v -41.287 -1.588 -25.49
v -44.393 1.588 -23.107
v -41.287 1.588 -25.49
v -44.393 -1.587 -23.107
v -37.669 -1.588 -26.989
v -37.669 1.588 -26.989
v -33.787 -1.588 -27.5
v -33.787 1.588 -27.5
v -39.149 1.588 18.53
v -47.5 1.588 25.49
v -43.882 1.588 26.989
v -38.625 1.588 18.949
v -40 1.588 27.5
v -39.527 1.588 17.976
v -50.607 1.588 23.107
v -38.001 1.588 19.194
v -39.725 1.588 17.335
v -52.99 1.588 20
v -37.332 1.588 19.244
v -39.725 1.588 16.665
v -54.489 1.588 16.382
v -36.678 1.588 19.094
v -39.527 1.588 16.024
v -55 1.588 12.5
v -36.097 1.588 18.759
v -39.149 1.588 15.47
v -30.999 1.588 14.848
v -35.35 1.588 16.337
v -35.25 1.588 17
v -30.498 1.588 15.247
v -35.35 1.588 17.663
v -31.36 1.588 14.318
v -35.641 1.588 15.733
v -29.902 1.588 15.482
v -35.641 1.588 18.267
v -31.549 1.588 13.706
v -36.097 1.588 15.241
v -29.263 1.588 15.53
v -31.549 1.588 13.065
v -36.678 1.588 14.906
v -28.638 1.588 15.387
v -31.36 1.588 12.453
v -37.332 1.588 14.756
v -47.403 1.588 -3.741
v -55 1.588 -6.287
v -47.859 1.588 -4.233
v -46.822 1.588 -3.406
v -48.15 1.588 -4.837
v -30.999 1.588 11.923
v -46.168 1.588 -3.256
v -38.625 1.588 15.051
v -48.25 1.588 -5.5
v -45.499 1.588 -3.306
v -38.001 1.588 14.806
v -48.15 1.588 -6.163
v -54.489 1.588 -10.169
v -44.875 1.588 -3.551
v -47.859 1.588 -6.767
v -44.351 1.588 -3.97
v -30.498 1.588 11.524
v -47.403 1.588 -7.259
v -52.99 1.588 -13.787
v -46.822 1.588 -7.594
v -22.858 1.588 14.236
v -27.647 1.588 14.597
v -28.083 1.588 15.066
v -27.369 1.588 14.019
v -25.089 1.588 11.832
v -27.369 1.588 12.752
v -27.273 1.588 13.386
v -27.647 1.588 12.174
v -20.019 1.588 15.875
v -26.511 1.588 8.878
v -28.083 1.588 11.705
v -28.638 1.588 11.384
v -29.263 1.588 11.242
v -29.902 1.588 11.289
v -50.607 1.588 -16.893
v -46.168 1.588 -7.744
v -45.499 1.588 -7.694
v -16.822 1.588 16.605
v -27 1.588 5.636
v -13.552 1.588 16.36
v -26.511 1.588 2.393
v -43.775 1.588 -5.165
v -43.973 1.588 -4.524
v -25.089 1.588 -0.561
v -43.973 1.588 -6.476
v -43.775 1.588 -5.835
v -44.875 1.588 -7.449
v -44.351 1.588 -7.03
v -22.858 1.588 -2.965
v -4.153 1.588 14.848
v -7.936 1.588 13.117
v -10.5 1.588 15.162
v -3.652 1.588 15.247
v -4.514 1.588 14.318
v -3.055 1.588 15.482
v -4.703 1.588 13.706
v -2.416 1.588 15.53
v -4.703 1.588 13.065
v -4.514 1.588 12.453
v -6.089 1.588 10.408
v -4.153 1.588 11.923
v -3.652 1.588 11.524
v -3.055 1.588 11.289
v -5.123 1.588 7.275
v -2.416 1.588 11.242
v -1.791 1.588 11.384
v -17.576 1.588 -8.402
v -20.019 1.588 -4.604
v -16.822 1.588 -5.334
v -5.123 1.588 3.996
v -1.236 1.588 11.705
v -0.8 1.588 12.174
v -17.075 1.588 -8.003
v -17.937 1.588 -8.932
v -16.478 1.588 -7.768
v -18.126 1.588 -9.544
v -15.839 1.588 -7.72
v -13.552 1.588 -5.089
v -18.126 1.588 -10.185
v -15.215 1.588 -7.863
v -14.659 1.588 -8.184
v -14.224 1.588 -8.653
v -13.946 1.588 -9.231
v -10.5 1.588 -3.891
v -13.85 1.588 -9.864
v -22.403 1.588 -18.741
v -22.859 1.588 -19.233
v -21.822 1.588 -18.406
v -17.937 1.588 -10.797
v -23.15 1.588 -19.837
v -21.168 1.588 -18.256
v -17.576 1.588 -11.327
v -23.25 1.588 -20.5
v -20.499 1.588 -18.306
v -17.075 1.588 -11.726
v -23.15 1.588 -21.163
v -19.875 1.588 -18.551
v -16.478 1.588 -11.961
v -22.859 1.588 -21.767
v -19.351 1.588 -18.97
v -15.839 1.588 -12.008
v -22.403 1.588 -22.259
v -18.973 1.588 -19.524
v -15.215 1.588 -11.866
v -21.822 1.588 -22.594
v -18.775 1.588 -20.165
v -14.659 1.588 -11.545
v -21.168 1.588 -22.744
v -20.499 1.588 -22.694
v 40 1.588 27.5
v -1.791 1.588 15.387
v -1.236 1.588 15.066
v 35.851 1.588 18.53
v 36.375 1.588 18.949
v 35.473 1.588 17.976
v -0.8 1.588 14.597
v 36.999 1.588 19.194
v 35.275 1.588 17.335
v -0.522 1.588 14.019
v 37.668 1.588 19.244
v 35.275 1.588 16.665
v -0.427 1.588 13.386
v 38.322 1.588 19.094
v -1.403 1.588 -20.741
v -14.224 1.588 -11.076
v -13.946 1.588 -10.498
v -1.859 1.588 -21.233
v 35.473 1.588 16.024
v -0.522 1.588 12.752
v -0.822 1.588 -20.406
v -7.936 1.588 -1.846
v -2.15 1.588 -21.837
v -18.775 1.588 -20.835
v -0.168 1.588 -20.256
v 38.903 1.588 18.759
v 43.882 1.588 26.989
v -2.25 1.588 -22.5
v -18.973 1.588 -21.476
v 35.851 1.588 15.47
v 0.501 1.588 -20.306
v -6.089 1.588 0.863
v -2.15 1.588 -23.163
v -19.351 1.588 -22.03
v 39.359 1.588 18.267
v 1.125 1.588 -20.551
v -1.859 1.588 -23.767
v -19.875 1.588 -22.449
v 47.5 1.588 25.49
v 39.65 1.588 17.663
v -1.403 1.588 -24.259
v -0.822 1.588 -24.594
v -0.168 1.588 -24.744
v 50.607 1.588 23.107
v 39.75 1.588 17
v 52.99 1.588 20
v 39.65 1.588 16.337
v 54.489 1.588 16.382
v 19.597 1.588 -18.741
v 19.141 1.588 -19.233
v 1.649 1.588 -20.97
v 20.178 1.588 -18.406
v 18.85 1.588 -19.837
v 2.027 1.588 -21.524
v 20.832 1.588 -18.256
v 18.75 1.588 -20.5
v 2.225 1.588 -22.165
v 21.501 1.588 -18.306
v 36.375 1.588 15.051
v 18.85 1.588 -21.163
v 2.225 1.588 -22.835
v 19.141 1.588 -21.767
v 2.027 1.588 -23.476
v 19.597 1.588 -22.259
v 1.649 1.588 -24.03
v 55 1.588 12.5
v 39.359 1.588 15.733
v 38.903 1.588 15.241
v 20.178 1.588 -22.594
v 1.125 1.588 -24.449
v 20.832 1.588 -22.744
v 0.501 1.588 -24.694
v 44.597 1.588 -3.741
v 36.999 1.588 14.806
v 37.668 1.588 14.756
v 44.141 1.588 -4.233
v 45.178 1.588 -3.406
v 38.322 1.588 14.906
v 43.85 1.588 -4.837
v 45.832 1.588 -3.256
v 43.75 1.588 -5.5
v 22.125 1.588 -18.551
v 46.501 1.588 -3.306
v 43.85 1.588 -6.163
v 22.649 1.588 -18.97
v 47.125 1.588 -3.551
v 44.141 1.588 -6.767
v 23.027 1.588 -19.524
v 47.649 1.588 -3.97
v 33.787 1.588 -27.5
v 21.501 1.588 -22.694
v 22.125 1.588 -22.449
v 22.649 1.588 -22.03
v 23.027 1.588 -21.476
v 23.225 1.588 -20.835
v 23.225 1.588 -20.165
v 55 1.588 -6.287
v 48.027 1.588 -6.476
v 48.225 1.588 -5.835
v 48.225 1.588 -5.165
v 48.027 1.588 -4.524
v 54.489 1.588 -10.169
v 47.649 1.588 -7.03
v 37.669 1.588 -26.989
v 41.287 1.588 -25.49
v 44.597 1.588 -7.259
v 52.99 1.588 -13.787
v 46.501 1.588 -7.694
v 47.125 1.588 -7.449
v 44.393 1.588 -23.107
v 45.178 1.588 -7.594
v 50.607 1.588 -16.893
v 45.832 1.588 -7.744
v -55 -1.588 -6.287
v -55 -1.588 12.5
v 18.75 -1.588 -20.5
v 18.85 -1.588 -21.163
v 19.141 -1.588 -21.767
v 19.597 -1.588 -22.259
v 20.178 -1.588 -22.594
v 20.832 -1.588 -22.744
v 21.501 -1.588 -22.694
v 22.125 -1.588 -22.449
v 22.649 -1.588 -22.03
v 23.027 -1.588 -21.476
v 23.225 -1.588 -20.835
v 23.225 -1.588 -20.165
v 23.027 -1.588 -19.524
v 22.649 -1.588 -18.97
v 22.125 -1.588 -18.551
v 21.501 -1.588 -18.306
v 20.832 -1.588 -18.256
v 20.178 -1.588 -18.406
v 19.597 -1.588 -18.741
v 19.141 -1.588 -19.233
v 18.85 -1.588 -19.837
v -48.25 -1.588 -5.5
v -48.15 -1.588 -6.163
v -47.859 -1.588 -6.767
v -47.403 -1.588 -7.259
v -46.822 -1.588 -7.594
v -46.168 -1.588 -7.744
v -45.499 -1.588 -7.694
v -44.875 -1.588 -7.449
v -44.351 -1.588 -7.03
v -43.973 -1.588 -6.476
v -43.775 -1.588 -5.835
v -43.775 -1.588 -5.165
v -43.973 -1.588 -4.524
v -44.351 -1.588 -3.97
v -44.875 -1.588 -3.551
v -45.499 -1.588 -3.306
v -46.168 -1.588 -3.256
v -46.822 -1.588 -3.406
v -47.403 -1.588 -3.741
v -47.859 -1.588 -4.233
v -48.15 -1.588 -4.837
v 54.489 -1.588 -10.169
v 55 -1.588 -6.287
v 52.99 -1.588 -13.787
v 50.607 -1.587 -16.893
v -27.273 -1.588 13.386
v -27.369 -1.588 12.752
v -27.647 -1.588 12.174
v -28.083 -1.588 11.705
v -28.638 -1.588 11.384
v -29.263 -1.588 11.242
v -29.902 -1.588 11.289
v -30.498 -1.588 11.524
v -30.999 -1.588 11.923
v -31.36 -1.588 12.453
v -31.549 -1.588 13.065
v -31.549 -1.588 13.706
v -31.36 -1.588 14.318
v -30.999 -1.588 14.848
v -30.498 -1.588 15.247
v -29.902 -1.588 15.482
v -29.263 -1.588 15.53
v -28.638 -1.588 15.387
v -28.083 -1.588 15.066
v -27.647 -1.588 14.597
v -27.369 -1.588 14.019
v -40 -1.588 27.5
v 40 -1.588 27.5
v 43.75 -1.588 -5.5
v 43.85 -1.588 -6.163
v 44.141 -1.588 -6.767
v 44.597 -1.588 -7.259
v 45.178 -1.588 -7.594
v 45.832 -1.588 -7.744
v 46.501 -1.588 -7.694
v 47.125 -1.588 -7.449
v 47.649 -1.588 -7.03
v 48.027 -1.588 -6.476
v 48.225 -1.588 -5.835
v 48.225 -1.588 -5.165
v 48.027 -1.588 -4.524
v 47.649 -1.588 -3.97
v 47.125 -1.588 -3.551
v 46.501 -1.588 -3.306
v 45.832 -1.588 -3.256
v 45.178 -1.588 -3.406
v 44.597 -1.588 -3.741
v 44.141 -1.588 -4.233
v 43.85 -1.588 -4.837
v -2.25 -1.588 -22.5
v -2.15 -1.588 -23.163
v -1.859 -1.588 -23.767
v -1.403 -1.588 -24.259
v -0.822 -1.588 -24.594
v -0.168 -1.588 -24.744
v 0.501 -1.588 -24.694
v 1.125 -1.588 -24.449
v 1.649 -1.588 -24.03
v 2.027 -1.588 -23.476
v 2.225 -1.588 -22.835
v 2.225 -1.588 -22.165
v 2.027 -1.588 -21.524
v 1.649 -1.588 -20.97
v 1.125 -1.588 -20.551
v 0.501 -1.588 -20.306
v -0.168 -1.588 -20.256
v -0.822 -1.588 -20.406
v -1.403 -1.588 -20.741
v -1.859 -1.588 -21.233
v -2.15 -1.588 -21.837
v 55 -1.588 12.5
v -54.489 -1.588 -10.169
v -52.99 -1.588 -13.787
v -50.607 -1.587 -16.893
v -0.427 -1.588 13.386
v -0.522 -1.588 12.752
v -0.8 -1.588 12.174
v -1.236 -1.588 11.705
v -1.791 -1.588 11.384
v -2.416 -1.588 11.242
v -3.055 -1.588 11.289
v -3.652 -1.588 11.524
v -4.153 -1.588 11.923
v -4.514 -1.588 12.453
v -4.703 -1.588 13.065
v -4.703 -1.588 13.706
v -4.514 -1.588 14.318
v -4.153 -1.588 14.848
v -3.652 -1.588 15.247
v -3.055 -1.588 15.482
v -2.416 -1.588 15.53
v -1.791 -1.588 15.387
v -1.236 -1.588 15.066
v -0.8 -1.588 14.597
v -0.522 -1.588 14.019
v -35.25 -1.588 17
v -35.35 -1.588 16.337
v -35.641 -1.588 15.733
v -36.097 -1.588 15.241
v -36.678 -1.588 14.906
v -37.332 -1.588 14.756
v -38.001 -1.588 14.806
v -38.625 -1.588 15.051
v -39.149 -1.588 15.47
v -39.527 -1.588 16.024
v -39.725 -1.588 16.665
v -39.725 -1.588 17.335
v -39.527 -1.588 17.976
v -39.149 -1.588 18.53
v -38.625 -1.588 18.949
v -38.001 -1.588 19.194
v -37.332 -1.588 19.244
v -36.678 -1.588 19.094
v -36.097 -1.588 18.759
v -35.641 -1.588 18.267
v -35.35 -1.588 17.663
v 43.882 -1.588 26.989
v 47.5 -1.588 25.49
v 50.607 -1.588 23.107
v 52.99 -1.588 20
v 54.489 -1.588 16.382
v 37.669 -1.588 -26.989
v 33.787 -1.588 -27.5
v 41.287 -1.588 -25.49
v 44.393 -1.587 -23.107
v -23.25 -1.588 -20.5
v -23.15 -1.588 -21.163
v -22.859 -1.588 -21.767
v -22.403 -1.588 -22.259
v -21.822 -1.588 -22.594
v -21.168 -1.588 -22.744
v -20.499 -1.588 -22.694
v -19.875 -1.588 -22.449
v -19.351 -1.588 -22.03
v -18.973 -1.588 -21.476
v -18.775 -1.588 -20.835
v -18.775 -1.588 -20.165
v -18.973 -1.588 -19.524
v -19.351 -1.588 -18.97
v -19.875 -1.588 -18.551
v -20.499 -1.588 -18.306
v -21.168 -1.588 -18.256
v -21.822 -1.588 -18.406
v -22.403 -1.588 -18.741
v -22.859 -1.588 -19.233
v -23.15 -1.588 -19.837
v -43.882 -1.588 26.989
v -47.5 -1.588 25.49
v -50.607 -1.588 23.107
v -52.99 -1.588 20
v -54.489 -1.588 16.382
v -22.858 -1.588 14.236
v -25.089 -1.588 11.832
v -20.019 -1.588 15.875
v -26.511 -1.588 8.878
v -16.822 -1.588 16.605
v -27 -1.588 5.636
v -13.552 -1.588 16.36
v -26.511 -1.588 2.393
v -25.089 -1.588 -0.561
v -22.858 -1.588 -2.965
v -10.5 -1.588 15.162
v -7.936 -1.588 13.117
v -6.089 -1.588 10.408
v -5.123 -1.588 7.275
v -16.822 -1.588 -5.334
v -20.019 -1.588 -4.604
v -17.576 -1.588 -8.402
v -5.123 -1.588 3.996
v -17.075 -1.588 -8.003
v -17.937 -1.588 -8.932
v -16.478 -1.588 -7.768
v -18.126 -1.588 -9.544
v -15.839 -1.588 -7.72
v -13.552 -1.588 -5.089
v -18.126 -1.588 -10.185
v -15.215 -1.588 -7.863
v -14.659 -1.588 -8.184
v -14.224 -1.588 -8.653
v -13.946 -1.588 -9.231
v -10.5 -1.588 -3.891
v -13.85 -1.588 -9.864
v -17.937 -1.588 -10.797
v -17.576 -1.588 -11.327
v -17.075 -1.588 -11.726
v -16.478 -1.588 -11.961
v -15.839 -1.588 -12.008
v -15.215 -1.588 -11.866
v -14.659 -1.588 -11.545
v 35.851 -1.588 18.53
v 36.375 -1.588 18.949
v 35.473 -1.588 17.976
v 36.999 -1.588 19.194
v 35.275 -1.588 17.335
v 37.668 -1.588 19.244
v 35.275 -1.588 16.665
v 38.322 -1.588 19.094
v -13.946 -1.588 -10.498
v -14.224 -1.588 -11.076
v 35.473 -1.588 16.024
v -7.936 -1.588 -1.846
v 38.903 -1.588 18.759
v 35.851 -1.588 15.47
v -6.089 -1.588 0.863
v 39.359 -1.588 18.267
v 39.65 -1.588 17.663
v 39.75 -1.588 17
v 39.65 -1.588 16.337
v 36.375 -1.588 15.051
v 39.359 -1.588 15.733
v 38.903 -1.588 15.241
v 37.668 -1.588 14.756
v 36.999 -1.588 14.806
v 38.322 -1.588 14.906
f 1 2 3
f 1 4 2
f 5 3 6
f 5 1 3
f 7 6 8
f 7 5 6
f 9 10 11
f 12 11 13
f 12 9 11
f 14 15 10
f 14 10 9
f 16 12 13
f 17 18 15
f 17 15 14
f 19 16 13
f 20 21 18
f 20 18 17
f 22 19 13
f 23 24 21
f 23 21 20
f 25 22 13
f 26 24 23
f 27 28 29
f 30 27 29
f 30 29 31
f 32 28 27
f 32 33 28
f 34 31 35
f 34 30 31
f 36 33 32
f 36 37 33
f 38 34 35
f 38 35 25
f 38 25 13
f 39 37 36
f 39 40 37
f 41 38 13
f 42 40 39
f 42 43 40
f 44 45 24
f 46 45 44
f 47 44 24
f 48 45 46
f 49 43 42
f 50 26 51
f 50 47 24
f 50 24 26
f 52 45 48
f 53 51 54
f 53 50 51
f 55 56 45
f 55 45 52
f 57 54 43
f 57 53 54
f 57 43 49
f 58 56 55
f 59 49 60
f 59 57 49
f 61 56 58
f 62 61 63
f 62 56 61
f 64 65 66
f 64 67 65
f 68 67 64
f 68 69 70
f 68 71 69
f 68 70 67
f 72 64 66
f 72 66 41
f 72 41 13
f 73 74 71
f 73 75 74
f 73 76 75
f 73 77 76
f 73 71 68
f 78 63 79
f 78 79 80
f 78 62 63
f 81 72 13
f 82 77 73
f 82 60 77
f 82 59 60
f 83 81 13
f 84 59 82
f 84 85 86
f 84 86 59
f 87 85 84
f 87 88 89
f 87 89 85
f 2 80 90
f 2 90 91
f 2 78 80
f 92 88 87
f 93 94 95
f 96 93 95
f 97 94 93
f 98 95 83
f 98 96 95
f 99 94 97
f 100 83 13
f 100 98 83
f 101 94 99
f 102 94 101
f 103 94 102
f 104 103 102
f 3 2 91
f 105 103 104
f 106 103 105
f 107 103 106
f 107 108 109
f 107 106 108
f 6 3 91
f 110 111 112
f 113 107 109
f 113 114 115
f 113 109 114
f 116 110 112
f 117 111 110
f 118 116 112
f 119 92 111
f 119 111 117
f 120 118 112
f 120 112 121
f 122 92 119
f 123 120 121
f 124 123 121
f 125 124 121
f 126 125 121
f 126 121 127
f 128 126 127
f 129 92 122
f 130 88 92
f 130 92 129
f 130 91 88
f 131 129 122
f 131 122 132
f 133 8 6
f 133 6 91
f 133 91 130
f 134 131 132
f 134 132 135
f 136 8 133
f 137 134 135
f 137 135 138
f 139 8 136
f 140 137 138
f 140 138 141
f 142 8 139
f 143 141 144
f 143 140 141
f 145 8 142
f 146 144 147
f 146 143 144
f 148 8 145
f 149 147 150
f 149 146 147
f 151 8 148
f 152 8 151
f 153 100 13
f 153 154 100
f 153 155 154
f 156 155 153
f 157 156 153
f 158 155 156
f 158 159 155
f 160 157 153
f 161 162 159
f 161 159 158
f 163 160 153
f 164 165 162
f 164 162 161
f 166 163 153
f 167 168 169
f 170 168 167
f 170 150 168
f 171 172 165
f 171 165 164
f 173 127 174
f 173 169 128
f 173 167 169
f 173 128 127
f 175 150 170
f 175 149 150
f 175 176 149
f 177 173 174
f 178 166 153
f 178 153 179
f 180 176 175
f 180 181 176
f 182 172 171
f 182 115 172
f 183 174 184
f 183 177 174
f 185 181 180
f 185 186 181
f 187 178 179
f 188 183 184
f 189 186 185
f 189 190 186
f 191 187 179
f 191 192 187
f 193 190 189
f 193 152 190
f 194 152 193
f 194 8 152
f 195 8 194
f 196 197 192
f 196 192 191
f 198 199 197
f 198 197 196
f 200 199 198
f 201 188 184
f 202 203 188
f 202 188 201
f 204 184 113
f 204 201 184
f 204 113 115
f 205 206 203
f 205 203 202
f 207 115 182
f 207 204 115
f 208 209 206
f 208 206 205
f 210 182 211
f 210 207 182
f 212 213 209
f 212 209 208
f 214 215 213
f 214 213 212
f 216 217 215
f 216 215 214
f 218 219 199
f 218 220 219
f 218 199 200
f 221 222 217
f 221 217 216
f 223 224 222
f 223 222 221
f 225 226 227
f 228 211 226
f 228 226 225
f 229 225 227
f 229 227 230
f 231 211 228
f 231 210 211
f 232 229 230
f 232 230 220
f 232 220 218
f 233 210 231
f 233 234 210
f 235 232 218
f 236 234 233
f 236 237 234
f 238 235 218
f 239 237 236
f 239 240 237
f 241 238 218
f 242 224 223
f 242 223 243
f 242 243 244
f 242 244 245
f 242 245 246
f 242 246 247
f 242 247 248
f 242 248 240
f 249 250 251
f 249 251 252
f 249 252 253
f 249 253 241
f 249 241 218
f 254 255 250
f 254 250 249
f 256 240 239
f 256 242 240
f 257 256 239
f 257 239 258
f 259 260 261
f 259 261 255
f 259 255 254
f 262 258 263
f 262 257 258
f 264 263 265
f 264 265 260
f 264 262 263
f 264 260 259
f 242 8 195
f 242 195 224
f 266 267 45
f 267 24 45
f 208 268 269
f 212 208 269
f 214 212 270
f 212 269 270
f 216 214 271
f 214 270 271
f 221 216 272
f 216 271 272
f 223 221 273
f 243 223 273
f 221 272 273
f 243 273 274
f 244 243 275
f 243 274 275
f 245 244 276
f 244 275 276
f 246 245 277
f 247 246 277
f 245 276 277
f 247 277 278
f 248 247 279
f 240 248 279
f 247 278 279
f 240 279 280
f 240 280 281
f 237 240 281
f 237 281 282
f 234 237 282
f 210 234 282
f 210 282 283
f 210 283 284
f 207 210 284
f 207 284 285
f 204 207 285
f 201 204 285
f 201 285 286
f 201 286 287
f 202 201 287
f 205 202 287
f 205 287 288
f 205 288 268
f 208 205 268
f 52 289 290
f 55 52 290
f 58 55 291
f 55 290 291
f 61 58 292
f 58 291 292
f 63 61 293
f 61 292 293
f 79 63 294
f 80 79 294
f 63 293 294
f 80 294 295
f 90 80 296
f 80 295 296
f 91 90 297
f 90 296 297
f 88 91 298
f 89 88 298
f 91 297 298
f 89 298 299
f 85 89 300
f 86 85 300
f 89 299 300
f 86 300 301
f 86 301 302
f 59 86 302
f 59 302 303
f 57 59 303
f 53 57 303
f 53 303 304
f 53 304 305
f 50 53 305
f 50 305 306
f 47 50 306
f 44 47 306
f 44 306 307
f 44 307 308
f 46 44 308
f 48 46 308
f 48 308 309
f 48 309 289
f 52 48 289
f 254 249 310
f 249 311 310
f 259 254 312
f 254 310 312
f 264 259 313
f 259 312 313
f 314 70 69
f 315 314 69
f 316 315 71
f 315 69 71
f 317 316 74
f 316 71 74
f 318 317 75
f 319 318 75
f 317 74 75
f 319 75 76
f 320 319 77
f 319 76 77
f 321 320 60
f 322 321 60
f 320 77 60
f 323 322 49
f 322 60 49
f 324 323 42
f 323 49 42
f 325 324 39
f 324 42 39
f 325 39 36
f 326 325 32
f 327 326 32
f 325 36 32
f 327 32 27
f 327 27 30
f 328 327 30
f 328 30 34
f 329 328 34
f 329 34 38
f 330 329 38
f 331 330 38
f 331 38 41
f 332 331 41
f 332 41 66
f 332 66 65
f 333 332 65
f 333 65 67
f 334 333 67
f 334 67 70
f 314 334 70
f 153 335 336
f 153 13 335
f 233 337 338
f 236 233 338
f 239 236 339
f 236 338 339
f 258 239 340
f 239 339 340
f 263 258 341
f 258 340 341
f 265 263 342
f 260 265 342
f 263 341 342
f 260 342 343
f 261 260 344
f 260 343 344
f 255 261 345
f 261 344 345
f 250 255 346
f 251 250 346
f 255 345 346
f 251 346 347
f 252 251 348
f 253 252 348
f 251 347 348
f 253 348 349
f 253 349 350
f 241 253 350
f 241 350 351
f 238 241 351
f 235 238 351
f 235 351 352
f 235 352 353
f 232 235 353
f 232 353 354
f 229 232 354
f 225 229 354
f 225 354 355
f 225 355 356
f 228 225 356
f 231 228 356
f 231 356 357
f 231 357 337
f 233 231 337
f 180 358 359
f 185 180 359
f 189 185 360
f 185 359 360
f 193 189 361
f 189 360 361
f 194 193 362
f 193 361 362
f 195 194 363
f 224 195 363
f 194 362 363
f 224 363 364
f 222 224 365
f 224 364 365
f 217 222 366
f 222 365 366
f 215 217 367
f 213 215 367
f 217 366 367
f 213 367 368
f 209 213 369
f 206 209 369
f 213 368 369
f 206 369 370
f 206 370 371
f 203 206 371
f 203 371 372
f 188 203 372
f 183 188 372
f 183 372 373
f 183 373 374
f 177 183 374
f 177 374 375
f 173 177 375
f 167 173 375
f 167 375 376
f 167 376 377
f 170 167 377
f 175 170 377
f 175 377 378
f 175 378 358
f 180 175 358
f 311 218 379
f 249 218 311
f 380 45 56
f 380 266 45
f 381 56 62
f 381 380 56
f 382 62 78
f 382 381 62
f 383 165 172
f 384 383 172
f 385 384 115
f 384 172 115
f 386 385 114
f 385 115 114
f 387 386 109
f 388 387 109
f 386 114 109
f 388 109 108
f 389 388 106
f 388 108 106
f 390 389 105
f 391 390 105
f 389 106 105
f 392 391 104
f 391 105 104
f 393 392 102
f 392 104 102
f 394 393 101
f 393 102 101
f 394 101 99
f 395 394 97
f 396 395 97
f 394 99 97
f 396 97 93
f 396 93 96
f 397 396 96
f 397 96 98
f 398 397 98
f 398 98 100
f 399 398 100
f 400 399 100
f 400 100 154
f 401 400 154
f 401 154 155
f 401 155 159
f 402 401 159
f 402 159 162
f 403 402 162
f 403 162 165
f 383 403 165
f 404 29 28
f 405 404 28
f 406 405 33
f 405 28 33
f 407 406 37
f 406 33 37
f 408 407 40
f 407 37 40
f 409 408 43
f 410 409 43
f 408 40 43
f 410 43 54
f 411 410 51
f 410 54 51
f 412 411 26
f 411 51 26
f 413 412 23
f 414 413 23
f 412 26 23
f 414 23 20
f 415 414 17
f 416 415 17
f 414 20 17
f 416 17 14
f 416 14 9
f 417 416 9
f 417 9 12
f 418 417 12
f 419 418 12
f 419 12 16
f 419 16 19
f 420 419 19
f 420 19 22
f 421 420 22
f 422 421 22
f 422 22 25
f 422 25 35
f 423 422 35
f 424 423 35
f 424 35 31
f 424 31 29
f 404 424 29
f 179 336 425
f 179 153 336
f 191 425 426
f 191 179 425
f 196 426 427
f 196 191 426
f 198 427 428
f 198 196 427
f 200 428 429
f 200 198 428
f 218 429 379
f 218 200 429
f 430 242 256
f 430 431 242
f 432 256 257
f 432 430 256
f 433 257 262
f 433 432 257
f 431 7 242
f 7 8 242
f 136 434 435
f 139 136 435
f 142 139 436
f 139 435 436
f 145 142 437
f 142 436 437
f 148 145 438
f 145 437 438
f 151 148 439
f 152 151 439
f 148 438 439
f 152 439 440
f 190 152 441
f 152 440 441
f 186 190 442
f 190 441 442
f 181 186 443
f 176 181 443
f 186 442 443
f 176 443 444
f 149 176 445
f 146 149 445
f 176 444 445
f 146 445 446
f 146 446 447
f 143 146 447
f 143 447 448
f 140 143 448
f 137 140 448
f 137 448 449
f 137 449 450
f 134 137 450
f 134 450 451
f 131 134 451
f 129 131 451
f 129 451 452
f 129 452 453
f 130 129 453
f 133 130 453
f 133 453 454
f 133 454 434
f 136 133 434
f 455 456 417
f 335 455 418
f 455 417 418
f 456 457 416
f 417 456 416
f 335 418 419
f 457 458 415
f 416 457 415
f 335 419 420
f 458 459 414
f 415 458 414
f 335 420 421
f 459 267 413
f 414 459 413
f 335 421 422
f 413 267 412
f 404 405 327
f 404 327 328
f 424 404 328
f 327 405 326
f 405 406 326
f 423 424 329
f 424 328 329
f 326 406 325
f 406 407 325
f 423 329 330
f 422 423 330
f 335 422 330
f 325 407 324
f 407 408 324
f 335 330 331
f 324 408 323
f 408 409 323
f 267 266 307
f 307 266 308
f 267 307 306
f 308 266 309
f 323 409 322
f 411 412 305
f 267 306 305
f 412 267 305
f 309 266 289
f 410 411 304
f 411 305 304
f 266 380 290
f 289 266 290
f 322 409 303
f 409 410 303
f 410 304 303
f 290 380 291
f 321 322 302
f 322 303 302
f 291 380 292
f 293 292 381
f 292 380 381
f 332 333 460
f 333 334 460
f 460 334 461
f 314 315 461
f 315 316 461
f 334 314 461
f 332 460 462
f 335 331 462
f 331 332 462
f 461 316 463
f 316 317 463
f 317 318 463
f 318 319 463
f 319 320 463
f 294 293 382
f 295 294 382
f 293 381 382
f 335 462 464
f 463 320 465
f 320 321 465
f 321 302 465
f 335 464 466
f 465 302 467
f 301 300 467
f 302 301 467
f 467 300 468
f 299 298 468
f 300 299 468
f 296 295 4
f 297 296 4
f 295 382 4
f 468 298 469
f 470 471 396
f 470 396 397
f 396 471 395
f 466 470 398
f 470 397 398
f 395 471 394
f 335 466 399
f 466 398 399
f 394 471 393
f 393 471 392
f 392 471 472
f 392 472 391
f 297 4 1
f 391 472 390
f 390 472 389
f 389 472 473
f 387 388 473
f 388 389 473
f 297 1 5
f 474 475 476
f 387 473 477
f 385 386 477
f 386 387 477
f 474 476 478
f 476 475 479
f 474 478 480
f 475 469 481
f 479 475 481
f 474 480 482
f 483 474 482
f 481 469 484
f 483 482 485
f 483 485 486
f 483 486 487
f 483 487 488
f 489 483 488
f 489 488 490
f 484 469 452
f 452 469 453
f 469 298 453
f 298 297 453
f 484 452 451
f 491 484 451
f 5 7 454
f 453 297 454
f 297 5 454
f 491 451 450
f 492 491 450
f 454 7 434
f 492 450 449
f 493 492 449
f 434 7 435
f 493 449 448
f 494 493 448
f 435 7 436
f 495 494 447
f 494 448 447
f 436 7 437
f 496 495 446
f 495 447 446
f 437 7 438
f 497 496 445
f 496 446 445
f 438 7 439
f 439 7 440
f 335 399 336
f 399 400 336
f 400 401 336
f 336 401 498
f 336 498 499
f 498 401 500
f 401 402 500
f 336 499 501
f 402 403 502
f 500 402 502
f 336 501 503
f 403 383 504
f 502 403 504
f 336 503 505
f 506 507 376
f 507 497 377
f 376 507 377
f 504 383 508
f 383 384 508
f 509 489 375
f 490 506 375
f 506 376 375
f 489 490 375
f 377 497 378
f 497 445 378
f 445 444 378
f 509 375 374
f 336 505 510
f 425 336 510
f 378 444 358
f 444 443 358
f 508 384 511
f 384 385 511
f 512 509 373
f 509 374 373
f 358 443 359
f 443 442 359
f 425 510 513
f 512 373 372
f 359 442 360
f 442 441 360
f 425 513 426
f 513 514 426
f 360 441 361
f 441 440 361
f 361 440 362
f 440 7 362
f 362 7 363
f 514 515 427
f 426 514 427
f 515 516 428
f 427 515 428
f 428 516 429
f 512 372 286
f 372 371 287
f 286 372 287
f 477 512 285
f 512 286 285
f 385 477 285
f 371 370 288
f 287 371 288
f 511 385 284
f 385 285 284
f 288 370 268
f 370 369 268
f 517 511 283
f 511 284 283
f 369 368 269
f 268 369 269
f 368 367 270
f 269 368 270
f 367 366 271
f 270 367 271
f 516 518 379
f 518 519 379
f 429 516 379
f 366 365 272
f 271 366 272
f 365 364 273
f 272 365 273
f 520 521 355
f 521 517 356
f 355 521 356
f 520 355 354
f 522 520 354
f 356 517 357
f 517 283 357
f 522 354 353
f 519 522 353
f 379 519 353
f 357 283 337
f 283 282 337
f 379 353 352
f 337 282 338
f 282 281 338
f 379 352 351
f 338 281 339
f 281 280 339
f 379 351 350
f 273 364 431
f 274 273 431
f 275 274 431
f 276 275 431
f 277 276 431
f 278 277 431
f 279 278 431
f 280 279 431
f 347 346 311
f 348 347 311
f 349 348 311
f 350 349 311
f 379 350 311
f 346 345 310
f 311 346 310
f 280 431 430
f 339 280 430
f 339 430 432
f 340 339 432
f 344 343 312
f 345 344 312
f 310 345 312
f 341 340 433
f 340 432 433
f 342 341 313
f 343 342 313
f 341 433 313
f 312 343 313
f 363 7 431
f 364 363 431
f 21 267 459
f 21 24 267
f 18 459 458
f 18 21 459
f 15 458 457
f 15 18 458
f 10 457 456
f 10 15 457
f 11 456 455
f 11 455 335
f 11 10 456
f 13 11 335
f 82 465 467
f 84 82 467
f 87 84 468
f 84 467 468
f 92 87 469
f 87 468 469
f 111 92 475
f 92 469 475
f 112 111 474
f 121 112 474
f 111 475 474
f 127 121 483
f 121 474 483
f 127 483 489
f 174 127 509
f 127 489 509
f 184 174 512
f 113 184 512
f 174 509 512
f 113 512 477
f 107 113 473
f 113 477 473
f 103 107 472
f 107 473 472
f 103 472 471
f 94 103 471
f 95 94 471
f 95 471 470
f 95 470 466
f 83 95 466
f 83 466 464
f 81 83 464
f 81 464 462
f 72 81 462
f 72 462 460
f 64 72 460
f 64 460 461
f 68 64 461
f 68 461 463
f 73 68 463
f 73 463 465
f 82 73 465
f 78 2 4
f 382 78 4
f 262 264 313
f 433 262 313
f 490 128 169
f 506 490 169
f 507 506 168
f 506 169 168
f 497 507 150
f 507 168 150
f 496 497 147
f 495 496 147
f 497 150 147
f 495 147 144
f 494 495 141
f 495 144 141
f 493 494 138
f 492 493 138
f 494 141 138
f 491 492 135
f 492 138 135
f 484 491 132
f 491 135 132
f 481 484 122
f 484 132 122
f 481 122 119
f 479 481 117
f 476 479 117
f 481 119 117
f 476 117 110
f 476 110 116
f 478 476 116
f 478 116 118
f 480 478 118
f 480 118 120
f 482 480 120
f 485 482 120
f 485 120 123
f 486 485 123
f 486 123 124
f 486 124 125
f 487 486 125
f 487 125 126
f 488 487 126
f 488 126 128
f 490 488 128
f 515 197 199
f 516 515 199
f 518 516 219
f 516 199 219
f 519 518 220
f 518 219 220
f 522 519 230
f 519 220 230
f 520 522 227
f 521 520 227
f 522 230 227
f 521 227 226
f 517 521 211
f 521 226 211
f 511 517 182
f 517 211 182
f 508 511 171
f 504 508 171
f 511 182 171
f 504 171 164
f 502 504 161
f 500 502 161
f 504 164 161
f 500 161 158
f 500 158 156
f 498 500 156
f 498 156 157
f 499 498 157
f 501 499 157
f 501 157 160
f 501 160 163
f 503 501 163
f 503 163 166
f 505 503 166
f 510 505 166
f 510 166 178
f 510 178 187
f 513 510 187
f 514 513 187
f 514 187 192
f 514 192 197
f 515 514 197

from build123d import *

# Parameters (mm, degrees)
SKETCH2_W                = 110
SKETCH2_H                = 55
BOSS_EXTRUDE1_DEPTH      = 1.5875
M4_CLEARANCE_HOLE1_D     = 4.5
M4_CLEARANCE_HOLE2_D     = 4.5
CHAMFER1_SIZE            = 15
FILLET1_R                = 15
SKETCH8_R                = 11
CUT_EXTRUDE1_DEPTH       = 4.175
M4_CLEARANCE_HOLE3_D     = 4.3
M4_CLEARANCE_HOLE3_DEPTH = 3.175


with BuildPart() as part:
    # Sketch2 → Boss-Extrude1 (new body, symmetric)
    with BuildSketch(Plane(origin=(0, 0, 0), x_dir=(1, 0, 0), z_dir=(0, 1, 0))):
        Rectangle(SKETCH2_W, SKETCH2_H)
    extrude(amount=BOSS_EXTRUDE1_DEPTH, both=True)

    # M4 Clearance Hole1 (through all)
    with Locations(Plane(origin=(0, 1.5875, 0), x_dir=(1, 0, 0), z_dir=(0, 1, 0))):
        with Locations((-46, 5.5), (-21, 20.5), (21, 20.5), (46, 5.5), (0, 22.5)):
            Hole(M4_CLEARANCE_HOLE1_D / 2)

    # M4 Clearance Hole2 (through all)
    with Locations(Plane(origin=(0, -1.5875, 0), x_dir=(-1, 0, 0), z_dir=(0, -1, 0))):
        with Locations((37.5, -17), (-37.5, -17)):
            Hole(M4_CLEARANCE_HOLE2_D / 2)

    # Chamfer1
    chamfer1_edges = [part.edges().sort_by_distance(p)[0] for p in [
        (-55, 0, -27.5),
        (55, 0, -27.5),
    ]]
    chamfer(chamfer1_edges, length=CHAMFER1_SIZE)

    # Fillet1
    fillet1_edges = [part.edges().sort_by_distance(p)[0] for p in [
        (-55, 0, -12.5),
        (40, 0, -27.5),
        (-40, 0, -27.5),
        (55, 0, -12.5),
        (55, 0, 27.5),
        (-55, 0, 27.5),
    ]]
    fillet(fillet1_edges, radius=FILLET1_R)

    # Sketch8 → Cut-Extrude1 (cut, through all)
    with BuildSketch(Plane(origin=(0, -1.5875, 0), x_dir=(-1, 0, 0), z_dir=(0, -1, 0))):
        with Locations((16, -5.635528726)):
            Circle(SKETCH8_R)
    extrude(amount=-CUT_EXTRUDE1_DEPTH, mode=Mode.SUBTRACT)

    # M4 Clearance Hole3
    with Locations(Plane(origin=(0, -1.5875, 0), x_dir=(-1, 0, 0), z_dir=(0, -1, 0))):
        with Locations((16, 9.864471274), (2.576606241, -13.385528726), (29.423393759, -13.385528726)):
            Hole(M4_CLEARANCE_HOLE3_D / 2, depth=M4_CLEARANCE_HOLE3_DEPTH)


solid = part.part
